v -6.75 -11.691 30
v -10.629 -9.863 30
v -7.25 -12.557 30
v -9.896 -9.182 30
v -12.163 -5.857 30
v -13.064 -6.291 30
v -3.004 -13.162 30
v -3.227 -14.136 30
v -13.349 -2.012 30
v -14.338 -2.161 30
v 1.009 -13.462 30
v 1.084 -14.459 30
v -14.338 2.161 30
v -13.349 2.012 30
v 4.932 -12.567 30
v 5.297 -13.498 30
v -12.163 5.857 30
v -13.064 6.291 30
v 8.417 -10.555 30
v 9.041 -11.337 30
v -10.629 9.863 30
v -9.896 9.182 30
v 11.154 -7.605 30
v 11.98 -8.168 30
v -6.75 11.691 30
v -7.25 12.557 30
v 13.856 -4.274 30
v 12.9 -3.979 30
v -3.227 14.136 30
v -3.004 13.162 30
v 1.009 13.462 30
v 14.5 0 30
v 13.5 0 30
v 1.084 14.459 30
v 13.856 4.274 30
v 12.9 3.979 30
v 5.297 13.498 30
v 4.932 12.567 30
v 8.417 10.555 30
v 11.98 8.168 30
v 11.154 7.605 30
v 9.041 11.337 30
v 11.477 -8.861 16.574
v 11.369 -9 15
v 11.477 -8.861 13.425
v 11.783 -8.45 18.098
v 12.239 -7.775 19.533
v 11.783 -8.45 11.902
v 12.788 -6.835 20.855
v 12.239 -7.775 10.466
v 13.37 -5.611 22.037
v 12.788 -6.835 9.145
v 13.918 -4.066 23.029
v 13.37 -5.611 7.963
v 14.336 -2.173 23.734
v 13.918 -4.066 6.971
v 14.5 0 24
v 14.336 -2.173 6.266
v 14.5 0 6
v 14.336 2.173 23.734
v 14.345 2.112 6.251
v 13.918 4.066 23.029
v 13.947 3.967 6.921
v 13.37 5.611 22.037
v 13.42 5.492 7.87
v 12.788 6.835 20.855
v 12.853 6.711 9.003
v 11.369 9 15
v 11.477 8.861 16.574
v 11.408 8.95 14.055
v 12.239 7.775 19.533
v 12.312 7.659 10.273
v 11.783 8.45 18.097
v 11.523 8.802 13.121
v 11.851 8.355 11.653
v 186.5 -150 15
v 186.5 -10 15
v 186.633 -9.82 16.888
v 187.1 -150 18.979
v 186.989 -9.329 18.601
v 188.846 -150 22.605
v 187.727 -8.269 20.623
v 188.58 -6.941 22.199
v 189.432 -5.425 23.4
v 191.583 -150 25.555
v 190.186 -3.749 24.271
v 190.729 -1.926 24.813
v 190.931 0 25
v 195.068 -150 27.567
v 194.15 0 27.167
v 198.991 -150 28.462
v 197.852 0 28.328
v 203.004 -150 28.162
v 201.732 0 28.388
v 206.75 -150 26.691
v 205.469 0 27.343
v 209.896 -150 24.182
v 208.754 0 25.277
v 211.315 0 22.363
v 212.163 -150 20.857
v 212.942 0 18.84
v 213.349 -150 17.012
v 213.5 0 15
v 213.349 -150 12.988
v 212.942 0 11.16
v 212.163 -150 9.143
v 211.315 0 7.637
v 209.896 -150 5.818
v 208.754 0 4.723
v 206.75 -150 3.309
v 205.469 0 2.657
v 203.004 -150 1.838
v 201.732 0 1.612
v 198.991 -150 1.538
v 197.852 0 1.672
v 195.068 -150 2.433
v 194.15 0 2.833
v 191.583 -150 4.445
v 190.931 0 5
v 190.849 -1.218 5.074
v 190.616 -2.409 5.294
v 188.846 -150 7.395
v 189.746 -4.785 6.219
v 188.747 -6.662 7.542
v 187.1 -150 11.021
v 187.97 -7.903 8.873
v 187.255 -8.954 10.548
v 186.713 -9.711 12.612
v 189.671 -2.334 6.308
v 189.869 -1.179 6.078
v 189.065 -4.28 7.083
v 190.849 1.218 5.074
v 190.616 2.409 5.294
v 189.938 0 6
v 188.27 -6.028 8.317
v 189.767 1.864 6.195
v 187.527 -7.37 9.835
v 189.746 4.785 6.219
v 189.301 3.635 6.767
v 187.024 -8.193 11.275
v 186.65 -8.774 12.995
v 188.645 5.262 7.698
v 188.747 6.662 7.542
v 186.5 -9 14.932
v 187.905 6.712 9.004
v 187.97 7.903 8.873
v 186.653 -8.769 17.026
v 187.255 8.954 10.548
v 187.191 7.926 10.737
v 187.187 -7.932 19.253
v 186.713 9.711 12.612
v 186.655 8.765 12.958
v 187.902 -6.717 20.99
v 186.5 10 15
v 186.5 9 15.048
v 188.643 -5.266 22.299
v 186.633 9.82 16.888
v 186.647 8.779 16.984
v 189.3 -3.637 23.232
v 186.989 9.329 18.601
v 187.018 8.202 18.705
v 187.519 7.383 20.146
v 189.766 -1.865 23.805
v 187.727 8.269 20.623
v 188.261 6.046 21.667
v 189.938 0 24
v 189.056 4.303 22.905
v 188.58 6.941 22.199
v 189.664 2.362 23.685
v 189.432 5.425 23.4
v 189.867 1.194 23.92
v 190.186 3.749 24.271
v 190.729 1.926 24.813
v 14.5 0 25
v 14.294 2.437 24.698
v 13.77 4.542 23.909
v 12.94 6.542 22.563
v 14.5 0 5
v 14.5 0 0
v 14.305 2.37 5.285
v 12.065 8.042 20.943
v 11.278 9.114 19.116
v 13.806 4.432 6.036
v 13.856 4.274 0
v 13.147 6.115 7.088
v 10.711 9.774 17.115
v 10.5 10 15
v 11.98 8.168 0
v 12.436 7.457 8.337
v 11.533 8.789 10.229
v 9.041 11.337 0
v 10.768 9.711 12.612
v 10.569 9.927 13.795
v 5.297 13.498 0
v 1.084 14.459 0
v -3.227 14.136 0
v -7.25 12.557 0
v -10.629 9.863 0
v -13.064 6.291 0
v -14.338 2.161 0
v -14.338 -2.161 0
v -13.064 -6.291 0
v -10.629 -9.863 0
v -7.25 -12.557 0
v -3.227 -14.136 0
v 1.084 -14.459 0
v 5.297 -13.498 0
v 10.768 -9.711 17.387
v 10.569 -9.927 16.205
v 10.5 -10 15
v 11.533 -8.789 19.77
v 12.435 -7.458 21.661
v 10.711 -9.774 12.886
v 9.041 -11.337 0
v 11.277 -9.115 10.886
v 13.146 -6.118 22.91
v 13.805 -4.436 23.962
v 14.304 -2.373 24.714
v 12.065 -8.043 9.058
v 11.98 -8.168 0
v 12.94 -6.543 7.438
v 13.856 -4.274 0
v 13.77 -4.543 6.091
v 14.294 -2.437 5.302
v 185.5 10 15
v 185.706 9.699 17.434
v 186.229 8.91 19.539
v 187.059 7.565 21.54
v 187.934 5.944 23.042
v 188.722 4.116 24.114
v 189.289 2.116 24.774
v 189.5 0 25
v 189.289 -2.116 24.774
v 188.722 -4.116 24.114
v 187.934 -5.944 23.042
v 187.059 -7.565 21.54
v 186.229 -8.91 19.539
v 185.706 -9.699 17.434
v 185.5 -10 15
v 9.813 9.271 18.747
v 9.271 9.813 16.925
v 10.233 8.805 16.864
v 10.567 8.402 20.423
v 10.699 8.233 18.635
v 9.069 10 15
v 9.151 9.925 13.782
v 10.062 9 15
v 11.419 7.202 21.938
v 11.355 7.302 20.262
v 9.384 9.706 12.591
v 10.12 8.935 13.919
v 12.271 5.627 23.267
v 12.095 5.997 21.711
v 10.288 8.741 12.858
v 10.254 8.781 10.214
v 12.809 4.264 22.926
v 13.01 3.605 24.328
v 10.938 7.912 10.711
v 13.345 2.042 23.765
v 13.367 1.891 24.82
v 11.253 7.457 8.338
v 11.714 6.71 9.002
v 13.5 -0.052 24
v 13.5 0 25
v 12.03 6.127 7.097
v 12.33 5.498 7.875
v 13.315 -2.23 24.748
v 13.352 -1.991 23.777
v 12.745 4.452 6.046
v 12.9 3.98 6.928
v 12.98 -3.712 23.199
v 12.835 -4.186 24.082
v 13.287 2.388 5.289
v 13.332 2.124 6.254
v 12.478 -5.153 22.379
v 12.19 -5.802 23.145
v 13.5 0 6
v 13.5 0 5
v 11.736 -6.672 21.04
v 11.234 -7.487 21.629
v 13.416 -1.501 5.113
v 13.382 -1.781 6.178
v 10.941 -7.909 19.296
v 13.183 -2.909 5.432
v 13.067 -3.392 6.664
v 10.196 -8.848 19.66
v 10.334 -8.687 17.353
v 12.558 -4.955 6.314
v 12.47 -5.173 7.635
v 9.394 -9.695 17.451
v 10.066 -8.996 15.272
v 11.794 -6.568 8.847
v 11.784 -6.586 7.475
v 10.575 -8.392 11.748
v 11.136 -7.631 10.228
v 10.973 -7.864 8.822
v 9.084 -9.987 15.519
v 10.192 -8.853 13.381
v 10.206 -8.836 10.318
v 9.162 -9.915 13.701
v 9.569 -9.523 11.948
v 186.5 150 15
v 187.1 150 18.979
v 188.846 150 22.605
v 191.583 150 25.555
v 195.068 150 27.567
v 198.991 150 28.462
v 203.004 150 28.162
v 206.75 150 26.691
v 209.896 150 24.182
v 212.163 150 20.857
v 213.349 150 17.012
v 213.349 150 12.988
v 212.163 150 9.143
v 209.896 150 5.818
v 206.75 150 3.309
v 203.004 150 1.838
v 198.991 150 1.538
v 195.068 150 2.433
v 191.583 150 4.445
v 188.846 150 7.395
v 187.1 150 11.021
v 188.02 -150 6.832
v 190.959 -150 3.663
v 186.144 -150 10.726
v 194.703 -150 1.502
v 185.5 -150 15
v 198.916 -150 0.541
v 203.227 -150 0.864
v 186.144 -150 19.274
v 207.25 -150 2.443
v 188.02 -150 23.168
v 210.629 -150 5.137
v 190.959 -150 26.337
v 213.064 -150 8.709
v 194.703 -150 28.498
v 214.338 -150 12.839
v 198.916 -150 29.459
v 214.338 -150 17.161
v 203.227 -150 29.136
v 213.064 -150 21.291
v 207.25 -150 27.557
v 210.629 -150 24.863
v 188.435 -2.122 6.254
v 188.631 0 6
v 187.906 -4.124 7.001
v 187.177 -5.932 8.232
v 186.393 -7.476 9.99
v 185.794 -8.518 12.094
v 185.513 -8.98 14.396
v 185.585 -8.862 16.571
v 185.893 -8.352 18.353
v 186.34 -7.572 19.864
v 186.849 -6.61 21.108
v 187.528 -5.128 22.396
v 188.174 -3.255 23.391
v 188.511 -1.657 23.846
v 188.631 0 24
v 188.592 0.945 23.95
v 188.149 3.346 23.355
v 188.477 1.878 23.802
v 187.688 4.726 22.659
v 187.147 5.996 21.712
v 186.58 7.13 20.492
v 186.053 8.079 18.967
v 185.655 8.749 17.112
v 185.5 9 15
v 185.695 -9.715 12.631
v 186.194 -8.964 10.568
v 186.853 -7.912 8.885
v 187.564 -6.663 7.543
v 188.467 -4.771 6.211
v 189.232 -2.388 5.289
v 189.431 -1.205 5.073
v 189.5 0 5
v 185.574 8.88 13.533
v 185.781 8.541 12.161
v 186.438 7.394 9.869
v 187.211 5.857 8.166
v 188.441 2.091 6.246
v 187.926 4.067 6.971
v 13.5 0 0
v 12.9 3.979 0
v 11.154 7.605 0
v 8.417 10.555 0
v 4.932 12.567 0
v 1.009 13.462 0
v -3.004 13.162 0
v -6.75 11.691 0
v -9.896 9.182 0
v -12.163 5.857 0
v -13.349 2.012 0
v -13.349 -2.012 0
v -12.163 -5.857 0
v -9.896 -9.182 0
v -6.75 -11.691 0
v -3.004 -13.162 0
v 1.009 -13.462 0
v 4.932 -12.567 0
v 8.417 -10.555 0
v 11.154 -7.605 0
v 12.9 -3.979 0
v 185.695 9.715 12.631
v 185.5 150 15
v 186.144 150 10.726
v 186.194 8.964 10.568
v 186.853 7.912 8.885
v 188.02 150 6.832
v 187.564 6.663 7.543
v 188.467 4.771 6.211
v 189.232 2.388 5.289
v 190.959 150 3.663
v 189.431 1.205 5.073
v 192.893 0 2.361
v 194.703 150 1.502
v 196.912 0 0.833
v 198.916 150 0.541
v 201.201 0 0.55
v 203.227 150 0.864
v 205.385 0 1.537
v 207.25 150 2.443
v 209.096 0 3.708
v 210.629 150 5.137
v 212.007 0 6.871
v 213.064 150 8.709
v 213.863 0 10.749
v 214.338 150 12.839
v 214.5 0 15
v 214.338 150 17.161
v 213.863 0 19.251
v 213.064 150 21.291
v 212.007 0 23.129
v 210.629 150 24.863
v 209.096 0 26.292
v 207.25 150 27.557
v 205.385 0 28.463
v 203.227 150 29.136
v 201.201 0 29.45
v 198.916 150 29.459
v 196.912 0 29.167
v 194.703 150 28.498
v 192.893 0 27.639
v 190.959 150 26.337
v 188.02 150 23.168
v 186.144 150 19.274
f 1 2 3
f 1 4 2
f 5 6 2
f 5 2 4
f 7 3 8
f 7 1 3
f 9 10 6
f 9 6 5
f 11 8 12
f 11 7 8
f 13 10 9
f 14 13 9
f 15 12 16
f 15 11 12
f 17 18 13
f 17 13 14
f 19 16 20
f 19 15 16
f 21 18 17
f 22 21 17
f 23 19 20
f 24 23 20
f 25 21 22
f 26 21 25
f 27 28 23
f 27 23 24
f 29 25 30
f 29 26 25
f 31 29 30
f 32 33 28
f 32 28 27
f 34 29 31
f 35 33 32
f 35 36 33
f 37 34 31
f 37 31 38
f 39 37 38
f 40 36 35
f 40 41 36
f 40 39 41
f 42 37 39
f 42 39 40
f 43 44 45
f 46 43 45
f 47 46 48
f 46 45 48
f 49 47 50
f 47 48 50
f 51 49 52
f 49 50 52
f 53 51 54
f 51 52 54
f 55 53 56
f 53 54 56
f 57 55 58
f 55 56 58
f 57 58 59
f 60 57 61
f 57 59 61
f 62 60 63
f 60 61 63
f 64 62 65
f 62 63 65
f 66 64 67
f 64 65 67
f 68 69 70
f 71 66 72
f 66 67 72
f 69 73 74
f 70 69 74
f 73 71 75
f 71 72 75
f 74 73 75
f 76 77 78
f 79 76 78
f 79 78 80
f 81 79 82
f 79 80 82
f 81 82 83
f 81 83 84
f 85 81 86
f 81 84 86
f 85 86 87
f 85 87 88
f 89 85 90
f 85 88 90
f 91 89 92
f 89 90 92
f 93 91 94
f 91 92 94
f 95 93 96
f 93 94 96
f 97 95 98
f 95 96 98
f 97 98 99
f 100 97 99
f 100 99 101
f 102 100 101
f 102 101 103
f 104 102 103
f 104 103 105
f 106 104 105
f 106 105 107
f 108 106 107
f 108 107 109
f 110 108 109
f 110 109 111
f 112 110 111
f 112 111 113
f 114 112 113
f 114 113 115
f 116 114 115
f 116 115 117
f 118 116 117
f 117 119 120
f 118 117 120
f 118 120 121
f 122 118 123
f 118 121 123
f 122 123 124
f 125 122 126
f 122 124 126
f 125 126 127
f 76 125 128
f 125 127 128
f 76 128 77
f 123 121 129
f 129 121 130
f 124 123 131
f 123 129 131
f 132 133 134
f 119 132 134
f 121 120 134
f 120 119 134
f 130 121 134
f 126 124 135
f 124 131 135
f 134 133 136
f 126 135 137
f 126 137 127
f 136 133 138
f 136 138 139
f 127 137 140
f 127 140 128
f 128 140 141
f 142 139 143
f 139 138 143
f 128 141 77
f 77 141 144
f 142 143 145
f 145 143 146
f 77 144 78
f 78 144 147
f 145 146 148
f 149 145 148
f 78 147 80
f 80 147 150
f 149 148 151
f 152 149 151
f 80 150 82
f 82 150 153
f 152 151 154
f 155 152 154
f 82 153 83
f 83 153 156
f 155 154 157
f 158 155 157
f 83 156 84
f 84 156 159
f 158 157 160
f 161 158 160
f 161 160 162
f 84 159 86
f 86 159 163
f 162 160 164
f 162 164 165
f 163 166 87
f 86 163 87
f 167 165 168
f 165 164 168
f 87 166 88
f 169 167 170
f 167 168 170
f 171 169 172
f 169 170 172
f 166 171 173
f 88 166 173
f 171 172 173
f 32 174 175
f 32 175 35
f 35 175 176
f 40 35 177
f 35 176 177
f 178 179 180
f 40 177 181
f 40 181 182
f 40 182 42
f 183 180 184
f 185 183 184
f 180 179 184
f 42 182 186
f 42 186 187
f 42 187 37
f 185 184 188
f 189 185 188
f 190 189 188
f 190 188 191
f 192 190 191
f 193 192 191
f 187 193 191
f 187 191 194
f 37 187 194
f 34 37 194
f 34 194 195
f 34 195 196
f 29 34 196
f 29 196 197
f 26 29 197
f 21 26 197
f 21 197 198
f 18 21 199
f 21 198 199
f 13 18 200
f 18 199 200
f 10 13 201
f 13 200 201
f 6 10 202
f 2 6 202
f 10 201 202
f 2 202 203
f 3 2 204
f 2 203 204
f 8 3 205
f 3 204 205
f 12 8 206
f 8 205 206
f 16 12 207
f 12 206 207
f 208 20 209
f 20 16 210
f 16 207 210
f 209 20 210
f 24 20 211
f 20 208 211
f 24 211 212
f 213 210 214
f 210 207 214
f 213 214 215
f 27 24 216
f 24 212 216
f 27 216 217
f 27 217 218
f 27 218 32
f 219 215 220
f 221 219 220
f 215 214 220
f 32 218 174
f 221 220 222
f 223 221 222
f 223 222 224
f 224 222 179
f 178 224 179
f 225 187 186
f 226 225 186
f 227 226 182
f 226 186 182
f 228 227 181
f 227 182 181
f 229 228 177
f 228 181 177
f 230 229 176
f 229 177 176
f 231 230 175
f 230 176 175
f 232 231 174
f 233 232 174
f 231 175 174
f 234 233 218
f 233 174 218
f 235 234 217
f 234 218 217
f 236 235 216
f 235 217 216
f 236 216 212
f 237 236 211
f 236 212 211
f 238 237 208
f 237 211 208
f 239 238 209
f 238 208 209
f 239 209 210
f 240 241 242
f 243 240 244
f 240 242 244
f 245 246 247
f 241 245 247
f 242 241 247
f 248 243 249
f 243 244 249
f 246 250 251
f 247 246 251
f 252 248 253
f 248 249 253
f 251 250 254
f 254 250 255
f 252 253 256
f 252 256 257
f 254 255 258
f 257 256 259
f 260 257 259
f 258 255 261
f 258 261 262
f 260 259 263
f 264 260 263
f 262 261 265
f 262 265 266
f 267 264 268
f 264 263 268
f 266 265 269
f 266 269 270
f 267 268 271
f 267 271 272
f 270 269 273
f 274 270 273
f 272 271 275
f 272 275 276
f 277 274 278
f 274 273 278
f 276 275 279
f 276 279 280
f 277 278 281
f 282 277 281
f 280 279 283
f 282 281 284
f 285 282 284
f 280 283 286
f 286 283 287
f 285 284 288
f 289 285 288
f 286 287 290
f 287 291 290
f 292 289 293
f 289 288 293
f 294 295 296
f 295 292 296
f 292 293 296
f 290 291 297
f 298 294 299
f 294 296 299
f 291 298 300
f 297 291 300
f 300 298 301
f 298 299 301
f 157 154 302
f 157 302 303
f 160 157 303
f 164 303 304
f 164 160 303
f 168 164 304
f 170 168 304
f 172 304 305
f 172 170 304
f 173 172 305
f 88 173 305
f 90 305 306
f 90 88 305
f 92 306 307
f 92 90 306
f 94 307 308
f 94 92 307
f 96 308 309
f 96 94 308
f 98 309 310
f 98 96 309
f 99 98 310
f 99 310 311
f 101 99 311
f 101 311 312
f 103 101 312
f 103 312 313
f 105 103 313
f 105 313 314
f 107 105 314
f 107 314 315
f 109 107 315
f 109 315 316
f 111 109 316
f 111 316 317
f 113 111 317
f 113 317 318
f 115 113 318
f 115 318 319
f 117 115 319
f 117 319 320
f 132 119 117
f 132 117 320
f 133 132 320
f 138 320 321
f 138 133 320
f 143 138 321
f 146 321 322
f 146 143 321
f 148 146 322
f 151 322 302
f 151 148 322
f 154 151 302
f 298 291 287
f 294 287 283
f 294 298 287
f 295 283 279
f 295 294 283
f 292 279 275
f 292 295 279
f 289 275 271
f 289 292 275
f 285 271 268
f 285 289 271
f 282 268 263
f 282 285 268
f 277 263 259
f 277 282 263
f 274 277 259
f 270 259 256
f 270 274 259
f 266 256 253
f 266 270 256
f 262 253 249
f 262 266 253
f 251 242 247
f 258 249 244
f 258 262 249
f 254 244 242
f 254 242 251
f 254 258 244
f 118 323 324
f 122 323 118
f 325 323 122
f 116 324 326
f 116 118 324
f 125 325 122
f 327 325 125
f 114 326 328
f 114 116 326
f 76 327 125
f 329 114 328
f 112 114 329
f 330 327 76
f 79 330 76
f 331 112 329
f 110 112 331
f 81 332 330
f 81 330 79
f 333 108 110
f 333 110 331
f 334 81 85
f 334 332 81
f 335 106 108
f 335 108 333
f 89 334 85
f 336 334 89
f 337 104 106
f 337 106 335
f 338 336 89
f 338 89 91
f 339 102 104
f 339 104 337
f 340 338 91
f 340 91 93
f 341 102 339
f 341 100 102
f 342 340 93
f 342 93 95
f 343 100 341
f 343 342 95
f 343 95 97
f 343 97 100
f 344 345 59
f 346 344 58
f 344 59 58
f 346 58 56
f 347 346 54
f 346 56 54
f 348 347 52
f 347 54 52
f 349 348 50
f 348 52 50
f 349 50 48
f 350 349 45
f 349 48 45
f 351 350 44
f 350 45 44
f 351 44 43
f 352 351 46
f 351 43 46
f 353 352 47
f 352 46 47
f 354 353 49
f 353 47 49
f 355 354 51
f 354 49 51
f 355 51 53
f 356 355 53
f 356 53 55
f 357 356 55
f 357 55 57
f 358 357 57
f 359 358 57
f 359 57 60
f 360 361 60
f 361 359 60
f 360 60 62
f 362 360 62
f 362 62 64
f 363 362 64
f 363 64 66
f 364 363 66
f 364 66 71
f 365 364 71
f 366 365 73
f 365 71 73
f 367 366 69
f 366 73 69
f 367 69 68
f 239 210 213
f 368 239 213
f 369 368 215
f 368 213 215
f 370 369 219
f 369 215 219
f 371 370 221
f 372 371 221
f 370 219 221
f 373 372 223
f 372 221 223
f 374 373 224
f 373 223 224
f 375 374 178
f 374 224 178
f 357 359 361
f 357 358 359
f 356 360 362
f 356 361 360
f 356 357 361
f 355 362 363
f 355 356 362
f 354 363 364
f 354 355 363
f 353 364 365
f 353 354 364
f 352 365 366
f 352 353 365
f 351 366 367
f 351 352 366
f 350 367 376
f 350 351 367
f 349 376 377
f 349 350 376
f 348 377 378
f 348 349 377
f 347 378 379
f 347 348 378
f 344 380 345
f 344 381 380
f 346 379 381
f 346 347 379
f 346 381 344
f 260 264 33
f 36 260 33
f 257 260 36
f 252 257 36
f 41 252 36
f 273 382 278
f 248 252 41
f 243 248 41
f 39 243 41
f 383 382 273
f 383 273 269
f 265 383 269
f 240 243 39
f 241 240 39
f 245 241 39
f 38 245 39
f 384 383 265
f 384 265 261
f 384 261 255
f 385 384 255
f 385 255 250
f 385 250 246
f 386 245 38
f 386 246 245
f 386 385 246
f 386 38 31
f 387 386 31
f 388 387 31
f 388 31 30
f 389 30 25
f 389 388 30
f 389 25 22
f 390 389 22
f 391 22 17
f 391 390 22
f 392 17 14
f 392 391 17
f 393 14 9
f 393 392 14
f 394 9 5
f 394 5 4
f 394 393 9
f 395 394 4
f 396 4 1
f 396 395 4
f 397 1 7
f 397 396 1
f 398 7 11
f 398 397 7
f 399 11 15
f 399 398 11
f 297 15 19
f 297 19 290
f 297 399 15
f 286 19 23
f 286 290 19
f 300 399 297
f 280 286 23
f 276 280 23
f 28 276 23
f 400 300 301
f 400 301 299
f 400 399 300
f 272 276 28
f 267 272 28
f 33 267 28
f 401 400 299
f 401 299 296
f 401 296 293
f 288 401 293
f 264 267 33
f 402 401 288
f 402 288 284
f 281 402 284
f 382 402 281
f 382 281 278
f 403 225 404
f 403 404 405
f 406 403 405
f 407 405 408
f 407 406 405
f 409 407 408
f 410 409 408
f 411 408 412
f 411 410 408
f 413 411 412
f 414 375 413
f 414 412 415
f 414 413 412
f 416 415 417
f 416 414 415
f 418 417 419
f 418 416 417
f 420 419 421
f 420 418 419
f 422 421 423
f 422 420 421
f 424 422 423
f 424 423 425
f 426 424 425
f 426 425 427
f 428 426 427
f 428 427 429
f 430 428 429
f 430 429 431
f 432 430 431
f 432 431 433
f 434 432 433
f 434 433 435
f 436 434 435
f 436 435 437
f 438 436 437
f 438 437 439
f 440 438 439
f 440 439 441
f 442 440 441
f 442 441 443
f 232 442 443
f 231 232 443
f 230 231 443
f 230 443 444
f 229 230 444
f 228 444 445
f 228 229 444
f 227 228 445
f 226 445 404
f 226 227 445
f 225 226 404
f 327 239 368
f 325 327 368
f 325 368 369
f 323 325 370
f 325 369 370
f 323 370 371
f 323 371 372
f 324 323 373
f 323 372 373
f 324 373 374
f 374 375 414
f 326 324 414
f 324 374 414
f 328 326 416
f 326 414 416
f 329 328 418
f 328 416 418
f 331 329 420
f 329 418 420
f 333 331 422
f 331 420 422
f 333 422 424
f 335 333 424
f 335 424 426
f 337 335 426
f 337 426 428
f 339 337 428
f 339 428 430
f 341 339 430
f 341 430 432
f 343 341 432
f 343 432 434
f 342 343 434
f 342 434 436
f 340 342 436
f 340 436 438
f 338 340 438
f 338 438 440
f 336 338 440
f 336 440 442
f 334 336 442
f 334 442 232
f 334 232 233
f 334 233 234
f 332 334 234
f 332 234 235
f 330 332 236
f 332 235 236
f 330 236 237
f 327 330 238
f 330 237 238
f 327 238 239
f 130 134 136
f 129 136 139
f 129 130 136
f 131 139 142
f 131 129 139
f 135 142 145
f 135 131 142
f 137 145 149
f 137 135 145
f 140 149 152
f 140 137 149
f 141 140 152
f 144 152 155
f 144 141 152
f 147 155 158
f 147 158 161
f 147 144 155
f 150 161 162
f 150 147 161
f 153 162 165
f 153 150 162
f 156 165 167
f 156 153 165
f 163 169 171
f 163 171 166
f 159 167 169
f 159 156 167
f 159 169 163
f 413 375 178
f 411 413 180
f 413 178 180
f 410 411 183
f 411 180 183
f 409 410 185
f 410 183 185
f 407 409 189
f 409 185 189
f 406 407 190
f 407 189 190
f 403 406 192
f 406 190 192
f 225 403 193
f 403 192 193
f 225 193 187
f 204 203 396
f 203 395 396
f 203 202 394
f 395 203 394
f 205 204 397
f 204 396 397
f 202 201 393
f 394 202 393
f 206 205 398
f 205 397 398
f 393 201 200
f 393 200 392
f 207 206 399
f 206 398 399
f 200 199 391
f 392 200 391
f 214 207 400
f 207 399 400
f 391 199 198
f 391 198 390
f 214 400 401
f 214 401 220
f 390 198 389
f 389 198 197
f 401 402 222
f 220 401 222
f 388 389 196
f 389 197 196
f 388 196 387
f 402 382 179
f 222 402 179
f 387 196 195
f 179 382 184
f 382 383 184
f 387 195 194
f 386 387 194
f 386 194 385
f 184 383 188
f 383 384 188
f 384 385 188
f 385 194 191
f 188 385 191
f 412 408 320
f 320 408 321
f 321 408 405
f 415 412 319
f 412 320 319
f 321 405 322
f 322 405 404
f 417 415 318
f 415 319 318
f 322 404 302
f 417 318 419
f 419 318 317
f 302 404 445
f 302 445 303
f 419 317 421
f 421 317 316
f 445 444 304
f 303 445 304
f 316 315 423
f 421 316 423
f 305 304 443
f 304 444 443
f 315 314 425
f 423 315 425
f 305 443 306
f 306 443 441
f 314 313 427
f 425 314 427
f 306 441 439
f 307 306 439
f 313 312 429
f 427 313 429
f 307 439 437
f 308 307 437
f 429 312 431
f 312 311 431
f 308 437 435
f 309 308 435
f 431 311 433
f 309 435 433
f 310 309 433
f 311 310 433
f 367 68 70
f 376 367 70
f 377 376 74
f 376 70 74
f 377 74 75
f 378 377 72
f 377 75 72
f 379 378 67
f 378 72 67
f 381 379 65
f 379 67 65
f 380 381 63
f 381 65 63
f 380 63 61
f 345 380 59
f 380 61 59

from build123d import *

# Parameters (mm, degrees)
F0_R          = 14.5
F0_R_2        = 13.5
F1_DEPTH      = 30
F3_DEPTH      = 200
F4_END_RADIUS = 13.5
F3_FACE_R     = 10
F3_FACE_R_2   = 9
F4_REACH      = 228.2852713475
F6_DEPTH      = 150
F8_END_RADIUS = 13.5
F3_FACE1_R    = 10
F3_FACE1_R_2  = 9
F8_REACH      = 242.7852713475


with BuildPart() as f1:
    # F0 (on Top) → F1 (new body)
    with BuildSketch(Plane.XY):
        Circle(F0_R)
        Circle(F0_R_2, mode=Mode.SUBTRACT)
    extrude(amount=F1_DEPTH)

    # F2 (on Right) → F3 (join)
    with BuildSketch(Plane.YZ):
        with BuildLine():
            ThreePointArc((10, 15), (-7.0710678119, 22.0710678119), (0, 5))
            ThreePointArc((0, 5), (7.0710678119, 7.9289321881), (10, 15))
        make_face()
        with BuildLine():
            ThreePointArc((9, 15), (6.3639610307, 8.6360389693), (0, 6))
            ThreePointArc((0, 6), (-6.3639610307, 21.3639610307), (9, 15))
        make_face(mode=Mode.SUBTRACT)
    extrude(amount=F3_DEPTH)

    f4_end = (Plane(origin=(0, 0, 15), x_dir=(-1, 0, 0), z_dir=(0, 0, -1)) * Cylinder(F4_END_RADIUS, 893.6117311859, mode=Mode.PRIVATE)).faces().sort_by_distance((-13.5, 0, 15))[0]
    # F3_face (on face) → F4 (cut, up to the whole of a round face its end follows)
    with BuildSketch(Plane(origin=(0, 0, 15), x_dir=(0, 1, 0), z_dir=(-1, 0, 0))):
        Circle(F3_FACE_R)
        Circle(F3_FACE_R_2, mode=Mode.SUBTRACT)
    f4_long = extrude(amount=-F4_REACH, mode=Mode.PRIVATE)
    add(split(f4_long, bisect_by=f4_end, keep=Keep.BOTTOM, mode=Mode.PRIVATE), mode=Mode.SUBTRACT)

    # F5 (on Front) → F6 (join)
    with BuildSketch(Plane.XZ):
        with BuildLine():
            ThreePointArc((214.5, 15), (200, 29.5), (185.5, 15))
            ThreePointArc((185.5, 15), (200, 0.5), (214.5, 15))
        make_face()
        with BuildLine():
            ThreePointArc((213.5, 15), (200, 1.5), (186.5, 15))
            ThreePointArc((186.5, 15), (200, 28.5), (213.5, 15))
        make_face(mode=Mode.SUBTRACT)
    extrude(amount=F6_DEPTH)

    # F7: F1 across plane


with BuildPart() as f1_1:
    add(f1.part)
    add(f1.part.mirror(Plane.XZ))

    f8_end = (Plane(origin=(200, 0, 15), x_dir=(0, 0, 1), z_dir=(0, 1, 0)) * Cylinder(F8_END_RADIUS, 1242.7785728256, mode=Mode.PRIVATE)).faces().sort_by_distance((186.5, -146.9757976235, 15))[0]
    # F3_face1 (on face) → F8 (cut, up to the whole of a round face its end follows)
    with BuildSketch(Plane(origin=(200, 0, 15), x_dir=(0, 1, 0), z_dir=(1, 0, 0))):
        Circle(F3_FACE1_R)
        Circle(F3_FACE1_R_2, mode=Mode.SUBTRACT)
    f8_long = extrude(amount=-F8_REACH, mode=Mode.PRIVATE)
    add(split(f8_long, bisect_by=f8_end, keep=Keep.BOTTOM, mode=Mode.PRIVATE), mode=Mode.SUBTRACT)


solid = f1_1.part
